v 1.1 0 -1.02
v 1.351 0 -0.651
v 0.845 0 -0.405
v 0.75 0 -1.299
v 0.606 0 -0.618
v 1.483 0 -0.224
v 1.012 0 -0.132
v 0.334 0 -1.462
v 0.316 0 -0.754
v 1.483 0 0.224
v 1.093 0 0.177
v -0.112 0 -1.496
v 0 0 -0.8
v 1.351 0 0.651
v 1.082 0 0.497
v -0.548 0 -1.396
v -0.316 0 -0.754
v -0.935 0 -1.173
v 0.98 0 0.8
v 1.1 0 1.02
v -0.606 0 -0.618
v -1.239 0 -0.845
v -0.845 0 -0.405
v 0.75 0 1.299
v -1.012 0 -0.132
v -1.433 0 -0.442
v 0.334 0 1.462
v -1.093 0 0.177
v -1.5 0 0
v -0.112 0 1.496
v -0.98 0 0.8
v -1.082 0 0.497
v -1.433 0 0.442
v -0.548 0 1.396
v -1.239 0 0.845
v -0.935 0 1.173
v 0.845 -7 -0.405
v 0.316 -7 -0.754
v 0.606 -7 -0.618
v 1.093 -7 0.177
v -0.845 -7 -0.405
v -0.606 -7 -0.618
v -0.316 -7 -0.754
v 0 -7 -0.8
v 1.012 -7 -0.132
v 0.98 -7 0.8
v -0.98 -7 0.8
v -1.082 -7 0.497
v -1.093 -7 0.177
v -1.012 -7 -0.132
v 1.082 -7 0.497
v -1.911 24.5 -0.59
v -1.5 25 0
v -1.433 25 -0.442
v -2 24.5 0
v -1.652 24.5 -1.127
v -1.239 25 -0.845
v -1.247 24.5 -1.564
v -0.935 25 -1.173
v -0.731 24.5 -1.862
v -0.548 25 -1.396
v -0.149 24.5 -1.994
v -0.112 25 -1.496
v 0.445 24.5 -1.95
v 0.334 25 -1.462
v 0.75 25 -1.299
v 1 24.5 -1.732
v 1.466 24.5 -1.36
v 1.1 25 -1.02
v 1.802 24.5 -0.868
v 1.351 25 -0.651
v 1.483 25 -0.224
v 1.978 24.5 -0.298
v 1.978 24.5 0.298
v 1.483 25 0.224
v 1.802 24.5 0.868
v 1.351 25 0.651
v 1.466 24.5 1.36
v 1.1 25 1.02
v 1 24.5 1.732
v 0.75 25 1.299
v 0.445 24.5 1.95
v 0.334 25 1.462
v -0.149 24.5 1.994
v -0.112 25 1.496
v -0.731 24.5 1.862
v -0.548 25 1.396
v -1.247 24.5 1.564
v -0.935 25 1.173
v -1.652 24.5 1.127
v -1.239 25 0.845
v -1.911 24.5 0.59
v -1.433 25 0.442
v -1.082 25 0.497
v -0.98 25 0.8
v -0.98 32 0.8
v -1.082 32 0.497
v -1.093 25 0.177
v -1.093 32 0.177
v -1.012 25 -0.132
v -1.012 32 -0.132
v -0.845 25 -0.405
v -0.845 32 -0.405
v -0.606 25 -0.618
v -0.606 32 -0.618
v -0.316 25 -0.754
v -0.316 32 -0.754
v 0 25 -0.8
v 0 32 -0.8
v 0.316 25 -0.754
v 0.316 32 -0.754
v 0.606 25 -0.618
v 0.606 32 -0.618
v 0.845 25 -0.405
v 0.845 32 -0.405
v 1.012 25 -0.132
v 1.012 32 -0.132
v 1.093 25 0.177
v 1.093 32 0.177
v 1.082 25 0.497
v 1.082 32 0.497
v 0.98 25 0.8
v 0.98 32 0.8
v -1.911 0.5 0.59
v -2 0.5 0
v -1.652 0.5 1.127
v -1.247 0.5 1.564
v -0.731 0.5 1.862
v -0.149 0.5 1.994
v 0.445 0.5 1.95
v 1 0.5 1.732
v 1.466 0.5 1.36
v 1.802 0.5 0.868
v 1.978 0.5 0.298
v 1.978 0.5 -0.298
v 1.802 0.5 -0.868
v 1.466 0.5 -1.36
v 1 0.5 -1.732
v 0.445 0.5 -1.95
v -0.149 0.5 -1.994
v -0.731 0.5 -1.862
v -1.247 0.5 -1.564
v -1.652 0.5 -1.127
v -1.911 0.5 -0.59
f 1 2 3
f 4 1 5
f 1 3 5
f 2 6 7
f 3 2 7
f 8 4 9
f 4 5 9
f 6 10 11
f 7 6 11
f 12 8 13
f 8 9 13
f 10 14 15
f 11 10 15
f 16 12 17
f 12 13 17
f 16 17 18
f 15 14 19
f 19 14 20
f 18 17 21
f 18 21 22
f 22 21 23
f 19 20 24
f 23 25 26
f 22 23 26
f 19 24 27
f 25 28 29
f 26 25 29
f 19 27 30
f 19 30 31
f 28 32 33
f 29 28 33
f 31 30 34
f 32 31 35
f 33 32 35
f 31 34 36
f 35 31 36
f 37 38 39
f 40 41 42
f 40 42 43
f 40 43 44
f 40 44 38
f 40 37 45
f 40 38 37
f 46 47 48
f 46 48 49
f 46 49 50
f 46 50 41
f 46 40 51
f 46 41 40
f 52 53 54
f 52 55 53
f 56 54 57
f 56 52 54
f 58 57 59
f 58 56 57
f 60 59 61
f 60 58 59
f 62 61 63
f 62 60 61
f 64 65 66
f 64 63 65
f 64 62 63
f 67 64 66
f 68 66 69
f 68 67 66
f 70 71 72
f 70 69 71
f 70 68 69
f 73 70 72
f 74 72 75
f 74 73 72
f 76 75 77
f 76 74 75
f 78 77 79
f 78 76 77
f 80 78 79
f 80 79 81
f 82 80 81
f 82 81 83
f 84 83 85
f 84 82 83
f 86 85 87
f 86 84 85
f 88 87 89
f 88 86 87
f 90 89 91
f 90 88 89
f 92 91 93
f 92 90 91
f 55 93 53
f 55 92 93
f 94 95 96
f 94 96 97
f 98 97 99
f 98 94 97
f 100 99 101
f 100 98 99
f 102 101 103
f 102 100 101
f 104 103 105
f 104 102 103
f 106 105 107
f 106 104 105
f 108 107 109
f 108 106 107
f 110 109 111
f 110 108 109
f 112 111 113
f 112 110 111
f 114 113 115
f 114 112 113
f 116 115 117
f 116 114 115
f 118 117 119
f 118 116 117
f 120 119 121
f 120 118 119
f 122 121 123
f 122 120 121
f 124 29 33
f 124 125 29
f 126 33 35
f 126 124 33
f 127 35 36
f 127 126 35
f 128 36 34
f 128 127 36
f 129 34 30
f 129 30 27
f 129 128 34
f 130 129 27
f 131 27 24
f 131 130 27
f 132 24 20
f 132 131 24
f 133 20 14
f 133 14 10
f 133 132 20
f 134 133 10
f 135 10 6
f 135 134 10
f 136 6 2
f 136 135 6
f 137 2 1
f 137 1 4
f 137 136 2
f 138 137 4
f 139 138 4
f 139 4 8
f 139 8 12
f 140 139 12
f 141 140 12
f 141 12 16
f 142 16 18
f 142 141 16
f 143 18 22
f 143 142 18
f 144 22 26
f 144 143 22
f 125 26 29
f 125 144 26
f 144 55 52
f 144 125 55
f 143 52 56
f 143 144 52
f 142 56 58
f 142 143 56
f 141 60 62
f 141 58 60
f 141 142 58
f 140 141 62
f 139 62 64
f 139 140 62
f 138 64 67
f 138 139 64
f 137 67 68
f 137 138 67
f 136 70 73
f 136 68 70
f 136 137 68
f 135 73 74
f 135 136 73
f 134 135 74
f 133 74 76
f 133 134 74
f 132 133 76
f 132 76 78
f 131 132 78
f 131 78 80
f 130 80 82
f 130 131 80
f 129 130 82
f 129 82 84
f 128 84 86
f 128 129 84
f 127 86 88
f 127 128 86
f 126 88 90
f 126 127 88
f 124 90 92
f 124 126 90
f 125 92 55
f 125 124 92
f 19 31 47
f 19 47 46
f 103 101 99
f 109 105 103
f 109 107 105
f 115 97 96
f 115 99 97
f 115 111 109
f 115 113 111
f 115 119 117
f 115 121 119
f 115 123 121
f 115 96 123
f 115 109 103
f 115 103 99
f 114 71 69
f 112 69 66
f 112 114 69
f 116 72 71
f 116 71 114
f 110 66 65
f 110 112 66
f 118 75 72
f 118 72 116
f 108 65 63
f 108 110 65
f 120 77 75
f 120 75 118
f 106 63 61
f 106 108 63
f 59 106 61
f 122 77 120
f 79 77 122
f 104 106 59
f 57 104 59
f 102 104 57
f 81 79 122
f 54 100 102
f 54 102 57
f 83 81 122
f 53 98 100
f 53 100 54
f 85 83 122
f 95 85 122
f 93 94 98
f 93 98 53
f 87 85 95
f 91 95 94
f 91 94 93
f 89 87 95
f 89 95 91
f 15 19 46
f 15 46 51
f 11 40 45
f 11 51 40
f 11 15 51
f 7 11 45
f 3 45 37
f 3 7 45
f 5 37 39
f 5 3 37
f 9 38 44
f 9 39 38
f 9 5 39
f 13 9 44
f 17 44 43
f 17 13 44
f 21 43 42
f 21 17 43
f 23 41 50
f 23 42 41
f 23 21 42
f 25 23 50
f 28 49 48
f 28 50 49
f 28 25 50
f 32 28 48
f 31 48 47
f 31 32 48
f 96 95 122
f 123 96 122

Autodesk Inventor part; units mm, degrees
ref_plane "XZ Plane" through (0, 0, 0) normal (0, 1, 0) x (-1, 0, 0)
ref_plane "XY Plane" through (0, 0, 0) normal (0, 0, 1) x (1, 0, 0)
sketch "Sketch1" plane through (0, 0, 0) normal (0, 1, 0) x (-1, 0, 0)
  circle A0 centre (0, 0) radius 2
  dimension "d0" = 4
extrude "Extrusion1" add sketch "Sketch1" along normal blind 25
sketch "Sketch2" plane through (0, 25, 0) normal (0, 1, 0) x (1, 0, 0)
  line L0 (0, -2) -> (2.3553, -2)
  line L1 (-0.9798, -0.8) -> (0.9798, -0.8)
  arc A0 (0.9798, -0.8) -> (-0.9798, -0.8) centre (0, -0.3) ccw
  circle A1 centre (0, 0) radius 2 projected
  line L2 (3.2263, 0) -> (-2.8711, 0) projected
  dimension "d4" = 1.2
  dimension "d6" = 1.1
  dimension "d7" = 0.3
extrude "Extrusion2" add sketch "Sketch2" along normal blind 7 contours A0 L2 L1 | A0 L2
sketch "Sketch3" plane through (0, 0, 0) normal (0, -1, 0) x (1, 0, 0)
  line L0 (-0.9798, 0.8) -> (0.9798, 0.8)
  arc A0 (-0.9798, 0.8) -> (0.9798, 0.8) centre (0, 0.3) ccw
  point P0 (0, 0)
  point P1 (0, 0)
  point P2 (0, 0.8)
  dimension "d12" = 1.9596
  dimension "d16" = 1.1
  dimension "d17" = 0.3
extrude "Extrusion3" add sketch "Sketch3" along normal blind 7
chamfer "Chamfer1" distance 0.5 angle 45 1 edges at (2, 25, 0)
chamfer "Chamfer2" distance 0.5 angle 45 1 edges at (2, 0, 0)
equation "\"d4\" = d3"
equation "\"d3\" = 1.2"
properties part number "axle-skibidi"
